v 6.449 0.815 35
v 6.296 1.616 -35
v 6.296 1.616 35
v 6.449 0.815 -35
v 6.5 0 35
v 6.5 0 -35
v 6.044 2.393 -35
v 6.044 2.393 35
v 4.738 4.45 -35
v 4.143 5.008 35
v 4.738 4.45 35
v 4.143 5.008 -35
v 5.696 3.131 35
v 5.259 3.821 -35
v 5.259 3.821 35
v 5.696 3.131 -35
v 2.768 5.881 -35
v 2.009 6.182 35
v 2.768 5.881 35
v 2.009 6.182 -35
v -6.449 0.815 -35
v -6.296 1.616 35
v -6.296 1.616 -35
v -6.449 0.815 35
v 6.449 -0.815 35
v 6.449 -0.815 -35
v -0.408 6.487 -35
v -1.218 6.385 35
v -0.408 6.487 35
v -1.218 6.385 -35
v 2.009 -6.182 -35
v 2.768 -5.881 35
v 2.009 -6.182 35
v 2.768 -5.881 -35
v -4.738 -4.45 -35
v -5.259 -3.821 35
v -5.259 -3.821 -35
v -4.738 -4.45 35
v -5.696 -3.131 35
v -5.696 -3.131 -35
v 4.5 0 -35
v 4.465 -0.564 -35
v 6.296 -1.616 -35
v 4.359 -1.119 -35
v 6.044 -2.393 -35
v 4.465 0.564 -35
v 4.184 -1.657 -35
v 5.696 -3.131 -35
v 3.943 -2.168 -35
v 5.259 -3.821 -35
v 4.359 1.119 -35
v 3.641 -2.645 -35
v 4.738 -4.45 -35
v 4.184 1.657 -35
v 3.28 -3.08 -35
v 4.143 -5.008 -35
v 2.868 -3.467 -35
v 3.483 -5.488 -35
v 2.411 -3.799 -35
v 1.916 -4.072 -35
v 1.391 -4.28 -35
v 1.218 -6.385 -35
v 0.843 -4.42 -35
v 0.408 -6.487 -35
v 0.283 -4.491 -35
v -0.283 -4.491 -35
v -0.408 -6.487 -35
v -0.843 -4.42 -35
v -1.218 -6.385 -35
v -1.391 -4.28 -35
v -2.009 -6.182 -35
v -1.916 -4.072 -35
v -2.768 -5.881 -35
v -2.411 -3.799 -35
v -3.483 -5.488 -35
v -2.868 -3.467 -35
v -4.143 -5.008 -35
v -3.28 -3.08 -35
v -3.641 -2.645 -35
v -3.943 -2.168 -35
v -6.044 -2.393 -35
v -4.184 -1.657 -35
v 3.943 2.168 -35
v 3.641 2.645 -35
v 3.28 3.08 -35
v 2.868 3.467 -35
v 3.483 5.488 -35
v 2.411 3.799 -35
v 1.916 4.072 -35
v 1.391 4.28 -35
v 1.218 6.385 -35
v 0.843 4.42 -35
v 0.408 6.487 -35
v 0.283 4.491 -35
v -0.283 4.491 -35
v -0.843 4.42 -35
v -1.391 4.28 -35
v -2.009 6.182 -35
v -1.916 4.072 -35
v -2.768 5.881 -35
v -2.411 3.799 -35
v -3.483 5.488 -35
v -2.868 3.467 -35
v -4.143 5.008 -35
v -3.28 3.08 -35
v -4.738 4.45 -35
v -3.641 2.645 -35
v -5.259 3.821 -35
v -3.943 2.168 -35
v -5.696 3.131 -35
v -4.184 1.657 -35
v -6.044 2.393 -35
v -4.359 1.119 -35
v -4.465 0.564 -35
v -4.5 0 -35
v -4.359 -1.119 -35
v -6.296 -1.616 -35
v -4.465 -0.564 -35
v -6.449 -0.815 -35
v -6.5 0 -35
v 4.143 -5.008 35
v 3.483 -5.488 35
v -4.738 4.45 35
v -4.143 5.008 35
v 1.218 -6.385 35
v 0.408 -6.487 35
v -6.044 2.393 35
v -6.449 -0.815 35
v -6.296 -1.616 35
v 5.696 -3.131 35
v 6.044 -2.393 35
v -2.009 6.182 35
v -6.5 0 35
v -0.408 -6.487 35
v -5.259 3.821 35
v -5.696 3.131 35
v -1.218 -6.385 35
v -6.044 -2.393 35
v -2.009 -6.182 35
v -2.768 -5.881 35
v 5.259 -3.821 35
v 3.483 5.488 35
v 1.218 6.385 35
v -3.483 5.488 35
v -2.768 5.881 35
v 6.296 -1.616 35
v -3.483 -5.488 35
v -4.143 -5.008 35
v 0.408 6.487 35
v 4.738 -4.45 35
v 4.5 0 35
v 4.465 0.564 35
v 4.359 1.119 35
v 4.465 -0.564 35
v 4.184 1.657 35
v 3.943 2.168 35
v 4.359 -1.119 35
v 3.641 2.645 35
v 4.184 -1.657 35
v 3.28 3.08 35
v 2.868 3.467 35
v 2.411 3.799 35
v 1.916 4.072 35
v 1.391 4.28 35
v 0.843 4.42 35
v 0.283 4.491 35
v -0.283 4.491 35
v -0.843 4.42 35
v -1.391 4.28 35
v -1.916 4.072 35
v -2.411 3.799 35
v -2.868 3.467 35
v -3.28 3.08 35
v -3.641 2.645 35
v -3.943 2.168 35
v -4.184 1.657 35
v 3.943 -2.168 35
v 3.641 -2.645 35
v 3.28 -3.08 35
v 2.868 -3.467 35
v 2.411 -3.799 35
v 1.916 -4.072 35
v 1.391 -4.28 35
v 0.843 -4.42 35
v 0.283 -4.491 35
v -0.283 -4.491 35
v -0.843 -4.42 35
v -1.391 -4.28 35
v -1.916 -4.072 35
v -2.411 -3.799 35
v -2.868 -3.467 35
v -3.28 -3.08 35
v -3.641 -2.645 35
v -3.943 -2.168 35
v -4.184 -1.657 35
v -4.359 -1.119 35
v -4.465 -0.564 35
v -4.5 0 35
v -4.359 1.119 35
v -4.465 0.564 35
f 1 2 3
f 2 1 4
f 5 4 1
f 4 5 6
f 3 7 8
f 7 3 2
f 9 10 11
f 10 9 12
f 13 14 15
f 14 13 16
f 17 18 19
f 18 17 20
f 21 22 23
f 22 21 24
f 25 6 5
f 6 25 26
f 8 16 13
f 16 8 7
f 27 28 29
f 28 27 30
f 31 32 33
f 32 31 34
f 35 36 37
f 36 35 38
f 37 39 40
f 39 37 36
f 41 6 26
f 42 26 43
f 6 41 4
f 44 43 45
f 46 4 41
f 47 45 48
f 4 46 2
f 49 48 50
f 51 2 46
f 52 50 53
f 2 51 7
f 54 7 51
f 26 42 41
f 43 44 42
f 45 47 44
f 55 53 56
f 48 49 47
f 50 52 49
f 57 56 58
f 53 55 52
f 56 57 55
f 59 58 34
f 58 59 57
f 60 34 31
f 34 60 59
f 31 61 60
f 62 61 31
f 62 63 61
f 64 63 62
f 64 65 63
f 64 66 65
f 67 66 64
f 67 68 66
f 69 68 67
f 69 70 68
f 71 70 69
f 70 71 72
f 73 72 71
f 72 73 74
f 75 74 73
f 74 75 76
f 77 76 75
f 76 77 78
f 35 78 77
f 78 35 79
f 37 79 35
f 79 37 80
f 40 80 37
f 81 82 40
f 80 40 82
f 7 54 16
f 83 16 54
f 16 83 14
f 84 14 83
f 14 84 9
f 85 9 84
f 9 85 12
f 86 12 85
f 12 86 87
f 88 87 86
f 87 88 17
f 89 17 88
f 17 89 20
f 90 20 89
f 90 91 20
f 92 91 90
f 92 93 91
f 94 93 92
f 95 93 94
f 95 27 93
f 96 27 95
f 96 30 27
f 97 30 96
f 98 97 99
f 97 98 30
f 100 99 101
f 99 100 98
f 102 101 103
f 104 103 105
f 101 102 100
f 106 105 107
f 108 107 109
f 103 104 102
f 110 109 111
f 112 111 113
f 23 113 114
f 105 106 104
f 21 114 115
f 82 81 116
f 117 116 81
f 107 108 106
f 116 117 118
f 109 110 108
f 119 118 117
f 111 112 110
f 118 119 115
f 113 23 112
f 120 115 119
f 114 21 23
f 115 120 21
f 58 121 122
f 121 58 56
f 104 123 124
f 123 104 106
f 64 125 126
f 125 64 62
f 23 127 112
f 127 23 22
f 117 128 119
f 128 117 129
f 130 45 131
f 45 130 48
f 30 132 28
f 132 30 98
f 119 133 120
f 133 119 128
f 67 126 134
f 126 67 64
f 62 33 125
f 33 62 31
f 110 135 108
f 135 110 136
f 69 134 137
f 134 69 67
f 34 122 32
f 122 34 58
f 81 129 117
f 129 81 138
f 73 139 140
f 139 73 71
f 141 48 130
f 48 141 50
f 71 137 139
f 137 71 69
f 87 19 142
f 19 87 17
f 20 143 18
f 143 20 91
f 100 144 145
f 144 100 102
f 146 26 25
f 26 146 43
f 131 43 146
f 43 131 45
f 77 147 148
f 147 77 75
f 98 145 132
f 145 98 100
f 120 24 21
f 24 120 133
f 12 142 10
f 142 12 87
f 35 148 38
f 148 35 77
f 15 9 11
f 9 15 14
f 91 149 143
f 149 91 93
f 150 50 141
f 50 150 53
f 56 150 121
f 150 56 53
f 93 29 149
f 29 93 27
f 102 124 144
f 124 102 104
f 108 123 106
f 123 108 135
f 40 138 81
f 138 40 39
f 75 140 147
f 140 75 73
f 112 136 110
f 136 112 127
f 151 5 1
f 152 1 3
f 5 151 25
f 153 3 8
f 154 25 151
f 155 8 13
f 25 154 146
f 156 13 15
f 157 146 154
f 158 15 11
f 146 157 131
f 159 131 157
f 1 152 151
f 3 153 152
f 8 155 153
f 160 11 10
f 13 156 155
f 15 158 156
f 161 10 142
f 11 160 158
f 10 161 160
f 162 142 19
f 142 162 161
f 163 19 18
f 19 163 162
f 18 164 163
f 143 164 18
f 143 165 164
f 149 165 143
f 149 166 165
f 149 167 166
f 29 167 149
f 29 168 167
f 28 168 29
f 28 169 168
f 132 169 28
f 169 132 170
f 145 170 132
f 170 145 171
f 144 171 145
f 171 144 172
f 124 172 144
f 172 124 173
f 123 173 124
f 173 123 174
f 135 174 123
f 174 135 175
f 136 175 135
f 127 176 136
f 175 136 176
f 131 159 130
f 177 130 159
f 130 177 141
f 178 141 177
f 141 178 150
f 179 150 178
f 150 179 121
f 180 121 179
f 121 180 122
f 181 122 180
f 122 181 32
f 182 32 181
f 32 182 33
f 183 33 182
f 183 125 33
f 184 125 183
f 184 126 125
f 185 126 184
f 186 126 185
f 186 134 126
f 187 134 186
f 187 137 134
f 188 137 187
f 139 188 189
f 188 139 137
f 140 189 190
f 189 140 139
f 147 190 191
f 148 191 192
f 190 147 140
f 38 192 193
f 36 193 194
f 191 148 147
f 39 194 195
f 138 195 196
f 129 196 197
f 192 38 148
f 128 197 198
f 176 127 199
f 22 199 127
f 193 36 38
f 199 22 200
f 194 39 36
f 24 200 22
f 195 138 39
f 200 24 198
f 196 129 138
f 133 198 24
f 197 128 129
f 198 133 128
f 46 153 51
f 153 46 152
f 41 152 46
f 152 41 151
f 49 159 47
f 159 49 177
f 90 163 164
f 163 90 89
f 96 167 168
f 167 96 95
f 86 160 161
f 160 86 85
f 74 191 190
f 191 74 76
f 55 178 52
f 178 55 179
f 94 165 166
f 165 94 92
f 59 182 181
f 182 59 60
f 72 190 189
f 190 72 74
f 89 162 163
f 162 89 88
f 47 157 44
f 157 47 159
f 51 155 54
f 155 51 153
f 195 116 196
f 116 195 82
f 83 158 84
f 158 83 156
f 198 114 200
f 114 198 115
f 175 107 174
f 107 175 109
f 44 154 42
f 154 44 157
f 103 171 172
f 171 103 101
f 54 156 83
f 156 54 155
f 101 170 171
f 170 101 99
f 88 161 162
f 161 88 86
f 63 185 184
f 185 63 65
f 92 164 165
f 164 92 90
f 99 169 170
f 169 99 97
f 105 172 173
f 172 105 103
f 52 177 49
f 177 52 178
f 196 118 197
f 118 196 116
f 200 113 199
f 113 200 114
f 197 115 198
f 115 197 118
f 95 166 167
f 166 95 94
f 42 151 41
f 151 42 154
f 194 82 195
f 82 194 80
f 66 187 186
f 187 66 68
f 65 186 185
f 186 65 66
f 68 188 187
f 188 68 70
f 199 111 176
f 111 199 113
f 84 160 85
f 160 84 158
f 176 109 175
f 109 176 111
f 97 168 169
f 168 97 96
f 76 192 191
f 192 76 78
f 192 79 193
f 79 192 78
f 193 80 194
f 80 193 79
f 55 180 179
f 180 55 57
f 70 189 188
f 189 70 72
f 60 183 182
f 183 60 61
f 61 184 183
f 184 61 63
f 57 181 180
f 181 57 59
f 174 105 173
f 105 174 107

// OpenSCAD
$fn = 50;


difference() {
	union() {
		translate(v = [0, 0, -35.0000000000]) {
			cylinder(h = 70, r = 6.5000000000);
		}
	}
	union() {
		translate(v = [0, 0, -100.0000000000]) {
			cylinder(h = 200, r = 4.5000000000);
		}
	}
}
